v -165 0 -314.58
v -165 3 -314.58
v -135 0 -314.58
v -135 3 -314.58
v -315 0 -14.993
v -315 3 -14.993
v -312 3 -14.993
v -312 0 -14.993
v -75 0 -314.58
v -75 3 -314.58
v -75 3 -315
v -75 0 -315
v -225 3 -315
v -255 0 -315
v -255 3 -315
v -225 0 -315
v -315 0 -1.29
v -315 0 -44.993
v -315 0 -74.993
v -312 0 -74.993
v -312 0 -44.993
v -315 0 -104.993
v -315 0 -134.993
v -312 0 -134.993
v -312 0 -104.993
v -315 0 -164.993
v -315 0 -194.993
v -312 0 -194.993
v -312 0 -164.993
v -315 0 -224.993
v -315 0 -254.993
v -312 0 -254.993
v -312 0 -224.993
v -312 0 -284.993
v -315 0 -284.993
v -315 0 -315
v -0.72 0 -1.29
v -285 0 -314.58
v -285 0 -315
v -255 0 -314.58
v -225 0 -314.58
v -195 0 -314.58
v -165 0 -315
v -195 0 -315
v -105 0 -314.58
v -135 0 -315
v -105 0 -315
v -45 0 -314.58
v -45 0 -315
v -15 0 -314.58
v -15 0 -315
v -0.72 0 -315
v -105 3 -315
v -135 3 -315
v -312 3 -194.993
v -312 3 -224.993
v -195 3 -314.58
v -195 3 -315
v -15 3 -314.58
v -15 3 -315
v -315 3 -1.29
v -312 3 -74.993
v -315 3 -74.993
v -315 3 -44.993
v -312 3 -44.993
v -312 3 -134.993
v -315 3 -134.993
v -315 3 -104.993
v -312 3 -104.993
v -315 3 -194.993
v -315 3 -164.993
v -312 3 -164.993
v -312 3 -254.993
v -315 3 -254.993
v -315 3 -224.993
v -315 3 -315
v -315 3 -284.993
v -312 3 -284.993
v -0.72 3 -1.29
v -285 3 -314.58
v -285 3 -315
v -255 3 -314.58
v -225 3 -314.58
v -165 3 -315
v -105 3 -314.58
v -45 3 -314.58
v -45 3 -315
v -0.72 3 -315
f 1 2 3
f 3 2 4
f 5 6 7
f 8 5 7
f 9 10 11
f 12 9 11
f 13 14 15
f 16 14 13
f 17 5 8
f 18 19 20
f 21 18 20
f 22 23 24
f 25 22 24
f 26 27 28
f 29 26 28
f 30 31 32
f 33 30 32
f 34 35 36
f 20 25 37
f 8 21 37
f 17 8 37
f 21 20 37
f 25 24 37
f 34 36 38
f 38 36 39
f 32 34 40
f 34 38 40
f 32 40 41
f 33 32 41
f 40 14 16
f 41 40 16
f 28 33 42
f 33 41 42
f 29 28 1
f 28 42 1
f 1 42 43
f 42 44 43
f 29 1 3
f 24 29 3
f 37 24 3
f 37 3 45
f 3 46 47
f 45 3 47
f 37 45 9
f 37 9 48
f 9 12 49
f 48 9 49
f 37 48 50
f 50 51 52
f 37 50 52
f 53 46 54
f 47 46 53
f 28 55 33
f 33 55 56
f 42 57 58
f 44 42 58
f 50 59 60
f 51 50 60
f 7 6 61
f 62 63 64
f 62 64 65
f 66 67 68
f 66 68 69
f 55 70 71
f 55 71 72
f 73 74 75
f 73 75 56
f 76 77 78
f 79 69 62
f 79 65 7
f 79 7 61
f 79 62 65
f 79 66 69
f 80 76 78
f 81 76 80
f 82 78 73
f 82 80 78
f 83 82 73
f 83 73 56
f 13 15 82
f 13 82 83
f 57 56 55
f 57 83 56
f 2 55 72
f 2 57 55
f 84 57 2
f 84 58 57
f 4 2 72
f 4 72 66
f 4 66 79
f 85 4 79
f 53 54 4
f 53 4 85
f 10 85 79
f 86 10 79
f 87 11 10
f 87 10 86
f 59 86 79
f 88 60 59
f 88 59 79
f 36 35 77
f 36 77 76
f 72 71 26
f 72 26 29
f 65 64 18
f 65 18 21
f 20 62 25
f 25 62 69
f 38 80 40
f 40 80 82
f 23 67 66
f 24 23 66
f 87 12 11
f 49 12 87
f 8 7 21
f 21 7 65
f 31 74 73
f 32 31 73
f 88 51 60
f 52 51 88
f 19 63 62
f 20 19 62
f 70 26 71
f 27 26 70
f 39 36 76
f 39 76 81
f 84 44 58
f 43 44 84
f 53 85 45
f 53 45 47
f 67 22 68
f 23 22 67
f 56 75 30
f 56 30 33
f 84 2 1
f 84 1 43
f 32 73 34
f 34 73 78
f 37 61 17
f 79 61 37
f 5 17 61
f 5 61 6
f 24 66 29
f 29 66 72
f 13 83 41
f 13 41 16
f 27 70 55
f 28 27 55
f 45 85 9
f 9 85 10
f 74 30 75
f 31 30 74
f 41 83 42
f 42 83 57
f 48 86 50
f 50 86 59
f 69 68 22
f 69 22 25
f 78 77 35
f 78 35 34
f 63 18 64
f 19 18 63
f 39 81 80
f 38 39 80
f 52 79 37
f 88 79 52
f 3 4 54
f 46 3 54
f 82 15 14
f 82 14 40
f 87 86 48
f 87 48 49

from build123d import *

# Parameters (mm, degrees)
SKETCH1_W               = 630
SKETCH1_H               = 630
BOSS_EXTRUDE1_DEPTH     = 3
SKETCH3_W               = 3
SKETCH3_H               = 30
CUT_EXTRUDE2_DEPTH      = 3
LPATTERN2_COUNT         = 10
LPATTERN2_PITCH         = 60
MIRROR1_COPY_1_SKETCH_W = 3
MIRROR1_COPY_1_SKETCH_H = 30
MIRROR1_COPY_1_DEPTH    = 3
MIRROR1_COPY_2_SKETCH_W = 3
MIRROR1_COPY_2_SKETCH_H = 30
MIRROR1_COPY_2_DEPTH    = 3
MIRROR1_COPY_3_SKETCH_W = 3
MIRROR1_COPY_3_SKETCH_H = 30
MIRROR1_COPY_3_DEPTH    = 3
MIRROR1_COPY_4_SKETCH_W = 3
MIRROR1_COPY_4_SKETCH_H = 30
MIRROR1_COPY_4_DEPTH    = 3
MIRROR1_COPY_5_SKETCH_W = 3
MIRROR1_COPY_5_SKETCH_H = 30
MIRROR1_COPY_5_DEPTH    = 3
MIRROR1_COPY_6_SKETCH_W = 3
MIRROR1_COPY_6_SKETCH_H = 30
MIRROR1_COPY_6_DEPTH    = 3
MIRROR1_COPY_7_SKETCH_W = 3
MIRROR1_COPY_7_SKETCH_H = 30
MIRROR1_COPY_7_DEPTH    = 3
MIRROR1_COPY_8_SKETCH_W = 3
MIRROR1_COPY_8_SKETCH_H = 30
MIRROR1_COPY_8_DEPTH    = 3
MIRROR1_COPY_9_SKETCH_W = 3
MIRROR1_COPY_9_SKETCH_H = 30
MIRROR1_COPY_9_DEPTH    = 3
SKETCH5_W               = 30
SKETCH5_H               = 3
CUT_EXTRUDE3_DEPTH      = 3
LPATTERN3_COUNT         = 10
LPATTERN3_PITCH         = 60
MIRROR2_COPY_1_SKETCH_W = 30
MIRROR2_COPY_1_SKETCH_H = 3
MIRROR2_COPY_1_DEPTH    = 3
MIRROR2_COPY_2_SKETCH_W = 30
MIRROR2_COPY_2_SKETCH_H = 3
MIRROR2_COPY_2_DEPTH    = 3
MIRROR2_COPY_3_SKETCH_W = 30
MIRROR2_COPY_3_SKETCH_H = 3
MIRROR2_COPY_3_DEPTH    = 3
MIRROR2_COPY_4_SKETCH_W = 30
MIRROR2_COPY_4_SKETCH_H = 3
MIRROR2_COPY_4_DEPTH    = 3
MIRROR2_COPY_5_SKETCH_W = 30
MIRROR2_COPY_5_SKETCH_H = 3
MIRROR2_COPY_5_DEPTH    = 3
MIRROR2_COPY_6_SKETCH_W = 30
MIRROR2_COPY_6_SKETCH_H = 3
MIRROR2_COPY_6_DEPTH    = 3
MIRROR2_COPY_7_SKETCH_W = 30
MIRROR2_COPY_7_SKETCH_H = 3
MIRROR2_COPY_7_DEPTH    = 3
MIRROR2_COPY_8_SKETCH_W = 30
MIRROR2_COPY_8_SKETCH_H = 3
MIRROR2_COPY_8_DEPTH    = 3
MIRROR2_COPY_9_SKETCH_W = 30
MIRROR2_COPY_9_SKETCH_H = 3
MIRROR2_COPY_9_DEPTH    = 3


with BuildPart() as part:
    # Sketch1 → Boss-Extrude1 (new body)
    with BuildSketch(Plane(origin=(0, 0, 0), x_dir=(1, 0, 0), z_dir=(0, 1, 0))):
        Rectangle(SKETCH1_W, SKETCH1_H)
    extrude(amount=BOSS_EXTRUDE1_DEPTH)

    # Sketch3 → Cut-Extrude2 (cut)
    with BuildSketch(Plane(origin=(0, 3, 0), x_dir=(1, 0, 0), z_dir=(0, 1, 0))):
        with Locations((-313.5, -270.006843512)):
            Rectangle(SKETCH3_W, SKETCH3_H)
    cut_extrude2 = extrude(amount=-CUT_EXTRUDE2_DEPTH, mode=Mode.SUBTRACT)

    # LPattern2: Cut-Extrude2 ×10
    with Locations(*[(0, 0, -i * LPATTERN2_PITCH) for i in range(1, LPATTERN2_COUNT)]):
        add(cut_extrude2, mode=Mode.SUBTRACT)

    # Mirror1: Cut-Extrude2 across plane
    add(cut_extrude2.mirror(Plane(origin=(-0.72, 0, 0), x_dir=(0, 0, 1), z_dir=(1, 0, 0))), mode=Mode.SUBTRACT)

    # Mirror1 copy 1 sketch → Mirror1 copy 1 (cut)
    with BuildSketch(Plane(origin=(-1.44, 3, -60), x_dir=(-1, 0, 0), z_dir=(0, 1, 0))):
        with Locations((-313.5, 270.006843512)):
            Rectangle(MIRROR1_COPY_1_SKETCH_W, MIRROR1_COPY_1_SKETCH_H)
    extrude(amount=-MIRROR1_COPY_1_DEPTH, mode=Mode.SUBTRACT)

    # Mirror1 copy 2 sketch → Mirror1 copy 2 (cut)
    with BuildSketch(Plane(origin=(-1.44, 3, -120), x_dir=(-1, 0, 0), z_dir=(0, 1, 0))):
        with Locations((-313.5, 270.006843512)):
            Rectangle(MIRROR1_COPY_2_SKETCH_W, MIRROR1_COPY_2_SKETCH_H)
    extrude(amount=-MIRROR1_COPY_2_DEPTH, mode=Mode.SUBTRACT)

    # Mirror1 copy 3 sketch → Mirror1 copy 3 (cut)
    with BuildSketch(Plane(origin=(-1.44, 3, -180), x_dir=(-1, 0, 0), z_dir=(0, 1, 0))):
        with Locations((-313.5, 270.006843512)):
            Rectangle(MIRROR1_COPY_3_SKETCH_W, MIRROR1_COPY_3_SKETCH_H)
    extrude(amount=-MIRROR1_COPY_3_DEPTH, mode=Mode.SUBTRACT)

    # Mirror1 copy 4 sketch → Mirror1 copy 4 (cut)
    with BuildSketch(Plane(origin=(-1.44, 3, -240), x_dir=(-1, 0, 0), z_dir=(0, 1, 0))):
        with Locations((-313.5, 270.006843512)):
            Rectangle(MIRROR1_COPY_4_SKETCH_W, MIRROR1_COPY_4_SKETCH_H)
    extrude(amount=-MIRROR1_COPY_4_DEPTH, mode=Mode.SUBTRACT)

    # Mirror1 copy 5 sketch → Mirror1 copy 5 (cut)
    with BuildSketch(Plane(origin=(-1.44, 3, -300), x_dir=(-1, 0, 0), z_dir=(0, 1, 0))):
        with Locations((-313.5, 270.006843512)):
            Rectangle(MIRROR1_COPY_5_SKETCH_W, MIRROR1_COPY_5_SKETCH_H)
    extrude(amount=-MIRROR1_COPY_5_DEPTH, mode=Mode.SUBTRACT)

    # Mirror1 copy 6 sketch → Mirror1 copy 6 (cut)
    with BuildSketch(Plane(origin=(-1.44, 3, -360), x_dir=(-1, 0, 0), z_dir=(0, 1, 0))):
        with Locations((-313.5, 270.006843512)):
            Rectangle(MIRROR1_COPY_6_SKETCH_W, MIRROR1_COPY_6_SKETCH_H)
    extrude(amount=-MIRROR1_COPY_6_DEPTH, mode=Mode.SUBTRACT)

    # Mirror1 copy 7 sketch → Mirror1 copy 7 (cut)
    with BuildSketch(Plane(origin=(-1.44, 3, -420), x_dir=(-1, 0, 0), z_dir=(0, 1, 0))):
        with Locations((-313.5, 270.006843512)):
            Rectangle(MIRROR1_COPY_7_SKETCH_W, MIRROR1_COPY_7_SKETCH_H)
    extrude(amount=-MIRROR1_COPY_7_DEPTH, mode=Mode.SUBTRACT)

    # Mirror1 copy 8 sketch → Mirror1 copy 8 (cut)
    with BuildSketch(Plane(origin=(-1.44, 3, -480), x_dir=(-1, 0, 0), z_dir=(0, 1, 0))):
        with Locations((-313.5, 270.006843512)):
            Rectangle(MIRROR1_COPY_8_SKETCH_W, MIRROR1_COPY_8_SKETCH_H)
    extrude(amount=-MIRROR1_COPY_8_DEPTH, mode=Mode.SUBTRACT)

    # Mirror1 copy 9 sketch → Mirror1 copy 9 (cut)
    with BuildSketch(Plane(origin=(-1.44, 3, -540), x_dir=(-1, 0, 0), z_dir=(0, 1, 0))):
        with Locations((-313.5, 270.006843512)):
            Rectangle(MIRROR1_COPY_9_SKETCH_W, MIRROR1_COPY_9_SKETCH_H)
    extrude(amount=-MIRROR1_COPY_9_DEPTH, mode=Mode.SUBTRACT)

    # Sketch5 → Cut-Extrude3 (cut)
    with BuildSketch(Plane(origin=(0, 3, 0), x_dir=(1, 0, 0), z_dir=(0, 1, 0))):
        with Locations((-270.000314512, -313.5)):
            Rectangle(SKETCH5_W, SKETCH5_H)
    cut_extrude3 = extrude(amount=-CUT_EXTRUDE3_DEPTH, mode=Mode.SUBTRACT)

    # LPattern3: Cut-Extrude3 ×10
    with Locations(*[(i * LPATTERN3_PITCH, 0, 0) for i in range(1, LPATTERN3_COUNT)]):
        add(cut_extrude3, mode=Mode.SUBTRACT)

    # Mirror2: Cut-Extrude3 across plane
    add(cut_extrude3.mirror(Plane.XY.offset(-1.29)), mode=Mode.SUBTRACT)

    # Mirror2 copy 1 sketch → Mirror2 copy 1 (cut)
    with BuildSketch(Plane(origin=(60, 3, -2.58), x_dir=(1, 0, 0), z_dir=(0, 1, 0))):
        with Locations((-270.000314512, 313.5)):
            Rectangle(MIRROR2_COPY_1_SKETCH_W, MIRROR2_COPY_1_SKETCH_H)
    extrude(amount=-MIRROR2_COPY_1_DEPTH, mode=Mode.SUBTRACT)

    # Mirror2 copy 2 sketch → Mirror2 copy 2 (cut)
    with BuildSketch(Plane(origin=(120, 3, -2.58), x_dir=(1, 0, 0), z_dir=(0, 1, 0))):
        with Locations((-270.000314512, 313.5)):
            Rectangle(MIRROR2_COPY_2_SKETCH_W, MIRROR2_COPY_2_SKETCH_H)
    extrude(amount=-MIRROR2_COPY_2_DEPTH, mode=Mode.SUBTRACT)

    # Mirror2 copy 3 sketch → Mirror2 copy 3 (cut)
    with BuildSketch(Plane(origin=(180, 3, -2.58), x_dir=(1, 0, 0), z_dir=(0, 1, 0))):
        with Locations((-270.000314512, 313.5)):
            Rectangle(MIRROR2_COPY_3_SKETCH_W, MIRROR2_COPY_3_SKETCH_H)
    extrude(amount=-MIRROR2_COPY_3_DEPTH, mode=Mode.SUBTRACT)

    # Mirror2 copy 4 sketch → Mirror2 copy 4 (cut)
    with BuildSketch(Plane(origin=(240, 3, -2.58), x_dir=(1, 0, 0), z_dir=(0, 1, 0))):
        with Locations((-270.000314512, 313.5)):
            Rectangle(MIRROR2_COPY_4_SKETCH_W, MIRROR2_COPY_4_SKETCH_H)
    extrude(amount=-MIRROR2_COPY_4_DEPTH, mode=Mode.SUBTRACT)

    # Mirror2 copy 5 sketch → Mirror2 copy 5 (cut)
    with BuildSketch(Plane(origin=(300, 3, -2.58), x_dir=(1, 0, 0), z_dir=(0, 1, 0))):
        with Locations((-270.000314512, 313.5)):
            Rectangle(MIRROR2_COPY_5_SKETCH_W, MIRROR2_COPY_5_SKETCH_H)
    extrude(amount=-MIRROR2_COPY_5_DEPTH, mode=Mode.SUBTRACT)

    # Mirror2 copy 6 sketch → Mirror2 copy 6 (cut)
    with BuildSketch(Plane(origin=(360, 3, -2.58), x_dir=(1, 0, 0), z_dir=(0, 1, 0))):
        with Locations((-270.000314512, 313.5)):
            Rectangle(MIRROR2_COPY_6_SKETCH_W, MIRROR2_COPY_6_SKETCH_H)
    extrude(amount=-MIRROR2_COPY_6_DEPTH, mode=Mode.SUBTRACT)

    # Mirror2 copy 7 sketch → Mirror2 copy 7 (cut)
    with BuildSketch(Plane(origin=(420, 3, -2.58), x_dir=(1, 0, 0), z_dir=(0, 1, 0))):
        with Locations((-270.000314512, 313.5)):
            Rectangle(MIRROR2_COPY_7_SKETCH_W, MIRROR2_COPY_7_SKETCH_H)
    extrude(amount=-MIRROR2_COPY_7_DEPTH, mode=Mode.SUBTRACT)

    # Mirror2 copy 8 sketch → Mirror2 copy 8 (cut)
    with BuildSketch(Plane(origin=(480, 3, -2.58), x_dir=(1, 0, 0), z_dir=(0, 1, 0))):
        with Locations((-270.000314512, 313.5)):
            Rectangle(MIRROR2_COPY_8_SKETCH_W, MIRROR2_COPY_8_SKETCH_H)
    extrude(amount=-MIRROR2_COPY_8_DEPTH, mode=Mode.SUBTRACT)

    # Mirror2 copy 9 sketch → Mirror2 copy 9 (cut)
    with BuildSketch(Plane(origin=(540, 3, -2.58), x_dir=(1, 0, 0), z_dir=(0, 1, 0))):
        with Locations((-270.000314512, 313.5)):
            Rectangle(MIRROR2_COPY_9_SKETCH_W, MIRROR2_COPY_9_SKETCH_H)
    extrude(amount=-MIRROR2_COPY_9_DEPTH, mode=Mode.SUBTRACT)

    # SurfaceCut1
    split(bisect_by=Plane.XY.offset(-1.29), keep=Keep.BOTTOM)

    # SurfaceCut2
    split(bisect_by=Plane(origin=(-0.72, 0, 0), x_dir=(0, 0, -1), z_dir=(1, 0, 0)), keep=Keep.BOTTOM)


solid = part.part
